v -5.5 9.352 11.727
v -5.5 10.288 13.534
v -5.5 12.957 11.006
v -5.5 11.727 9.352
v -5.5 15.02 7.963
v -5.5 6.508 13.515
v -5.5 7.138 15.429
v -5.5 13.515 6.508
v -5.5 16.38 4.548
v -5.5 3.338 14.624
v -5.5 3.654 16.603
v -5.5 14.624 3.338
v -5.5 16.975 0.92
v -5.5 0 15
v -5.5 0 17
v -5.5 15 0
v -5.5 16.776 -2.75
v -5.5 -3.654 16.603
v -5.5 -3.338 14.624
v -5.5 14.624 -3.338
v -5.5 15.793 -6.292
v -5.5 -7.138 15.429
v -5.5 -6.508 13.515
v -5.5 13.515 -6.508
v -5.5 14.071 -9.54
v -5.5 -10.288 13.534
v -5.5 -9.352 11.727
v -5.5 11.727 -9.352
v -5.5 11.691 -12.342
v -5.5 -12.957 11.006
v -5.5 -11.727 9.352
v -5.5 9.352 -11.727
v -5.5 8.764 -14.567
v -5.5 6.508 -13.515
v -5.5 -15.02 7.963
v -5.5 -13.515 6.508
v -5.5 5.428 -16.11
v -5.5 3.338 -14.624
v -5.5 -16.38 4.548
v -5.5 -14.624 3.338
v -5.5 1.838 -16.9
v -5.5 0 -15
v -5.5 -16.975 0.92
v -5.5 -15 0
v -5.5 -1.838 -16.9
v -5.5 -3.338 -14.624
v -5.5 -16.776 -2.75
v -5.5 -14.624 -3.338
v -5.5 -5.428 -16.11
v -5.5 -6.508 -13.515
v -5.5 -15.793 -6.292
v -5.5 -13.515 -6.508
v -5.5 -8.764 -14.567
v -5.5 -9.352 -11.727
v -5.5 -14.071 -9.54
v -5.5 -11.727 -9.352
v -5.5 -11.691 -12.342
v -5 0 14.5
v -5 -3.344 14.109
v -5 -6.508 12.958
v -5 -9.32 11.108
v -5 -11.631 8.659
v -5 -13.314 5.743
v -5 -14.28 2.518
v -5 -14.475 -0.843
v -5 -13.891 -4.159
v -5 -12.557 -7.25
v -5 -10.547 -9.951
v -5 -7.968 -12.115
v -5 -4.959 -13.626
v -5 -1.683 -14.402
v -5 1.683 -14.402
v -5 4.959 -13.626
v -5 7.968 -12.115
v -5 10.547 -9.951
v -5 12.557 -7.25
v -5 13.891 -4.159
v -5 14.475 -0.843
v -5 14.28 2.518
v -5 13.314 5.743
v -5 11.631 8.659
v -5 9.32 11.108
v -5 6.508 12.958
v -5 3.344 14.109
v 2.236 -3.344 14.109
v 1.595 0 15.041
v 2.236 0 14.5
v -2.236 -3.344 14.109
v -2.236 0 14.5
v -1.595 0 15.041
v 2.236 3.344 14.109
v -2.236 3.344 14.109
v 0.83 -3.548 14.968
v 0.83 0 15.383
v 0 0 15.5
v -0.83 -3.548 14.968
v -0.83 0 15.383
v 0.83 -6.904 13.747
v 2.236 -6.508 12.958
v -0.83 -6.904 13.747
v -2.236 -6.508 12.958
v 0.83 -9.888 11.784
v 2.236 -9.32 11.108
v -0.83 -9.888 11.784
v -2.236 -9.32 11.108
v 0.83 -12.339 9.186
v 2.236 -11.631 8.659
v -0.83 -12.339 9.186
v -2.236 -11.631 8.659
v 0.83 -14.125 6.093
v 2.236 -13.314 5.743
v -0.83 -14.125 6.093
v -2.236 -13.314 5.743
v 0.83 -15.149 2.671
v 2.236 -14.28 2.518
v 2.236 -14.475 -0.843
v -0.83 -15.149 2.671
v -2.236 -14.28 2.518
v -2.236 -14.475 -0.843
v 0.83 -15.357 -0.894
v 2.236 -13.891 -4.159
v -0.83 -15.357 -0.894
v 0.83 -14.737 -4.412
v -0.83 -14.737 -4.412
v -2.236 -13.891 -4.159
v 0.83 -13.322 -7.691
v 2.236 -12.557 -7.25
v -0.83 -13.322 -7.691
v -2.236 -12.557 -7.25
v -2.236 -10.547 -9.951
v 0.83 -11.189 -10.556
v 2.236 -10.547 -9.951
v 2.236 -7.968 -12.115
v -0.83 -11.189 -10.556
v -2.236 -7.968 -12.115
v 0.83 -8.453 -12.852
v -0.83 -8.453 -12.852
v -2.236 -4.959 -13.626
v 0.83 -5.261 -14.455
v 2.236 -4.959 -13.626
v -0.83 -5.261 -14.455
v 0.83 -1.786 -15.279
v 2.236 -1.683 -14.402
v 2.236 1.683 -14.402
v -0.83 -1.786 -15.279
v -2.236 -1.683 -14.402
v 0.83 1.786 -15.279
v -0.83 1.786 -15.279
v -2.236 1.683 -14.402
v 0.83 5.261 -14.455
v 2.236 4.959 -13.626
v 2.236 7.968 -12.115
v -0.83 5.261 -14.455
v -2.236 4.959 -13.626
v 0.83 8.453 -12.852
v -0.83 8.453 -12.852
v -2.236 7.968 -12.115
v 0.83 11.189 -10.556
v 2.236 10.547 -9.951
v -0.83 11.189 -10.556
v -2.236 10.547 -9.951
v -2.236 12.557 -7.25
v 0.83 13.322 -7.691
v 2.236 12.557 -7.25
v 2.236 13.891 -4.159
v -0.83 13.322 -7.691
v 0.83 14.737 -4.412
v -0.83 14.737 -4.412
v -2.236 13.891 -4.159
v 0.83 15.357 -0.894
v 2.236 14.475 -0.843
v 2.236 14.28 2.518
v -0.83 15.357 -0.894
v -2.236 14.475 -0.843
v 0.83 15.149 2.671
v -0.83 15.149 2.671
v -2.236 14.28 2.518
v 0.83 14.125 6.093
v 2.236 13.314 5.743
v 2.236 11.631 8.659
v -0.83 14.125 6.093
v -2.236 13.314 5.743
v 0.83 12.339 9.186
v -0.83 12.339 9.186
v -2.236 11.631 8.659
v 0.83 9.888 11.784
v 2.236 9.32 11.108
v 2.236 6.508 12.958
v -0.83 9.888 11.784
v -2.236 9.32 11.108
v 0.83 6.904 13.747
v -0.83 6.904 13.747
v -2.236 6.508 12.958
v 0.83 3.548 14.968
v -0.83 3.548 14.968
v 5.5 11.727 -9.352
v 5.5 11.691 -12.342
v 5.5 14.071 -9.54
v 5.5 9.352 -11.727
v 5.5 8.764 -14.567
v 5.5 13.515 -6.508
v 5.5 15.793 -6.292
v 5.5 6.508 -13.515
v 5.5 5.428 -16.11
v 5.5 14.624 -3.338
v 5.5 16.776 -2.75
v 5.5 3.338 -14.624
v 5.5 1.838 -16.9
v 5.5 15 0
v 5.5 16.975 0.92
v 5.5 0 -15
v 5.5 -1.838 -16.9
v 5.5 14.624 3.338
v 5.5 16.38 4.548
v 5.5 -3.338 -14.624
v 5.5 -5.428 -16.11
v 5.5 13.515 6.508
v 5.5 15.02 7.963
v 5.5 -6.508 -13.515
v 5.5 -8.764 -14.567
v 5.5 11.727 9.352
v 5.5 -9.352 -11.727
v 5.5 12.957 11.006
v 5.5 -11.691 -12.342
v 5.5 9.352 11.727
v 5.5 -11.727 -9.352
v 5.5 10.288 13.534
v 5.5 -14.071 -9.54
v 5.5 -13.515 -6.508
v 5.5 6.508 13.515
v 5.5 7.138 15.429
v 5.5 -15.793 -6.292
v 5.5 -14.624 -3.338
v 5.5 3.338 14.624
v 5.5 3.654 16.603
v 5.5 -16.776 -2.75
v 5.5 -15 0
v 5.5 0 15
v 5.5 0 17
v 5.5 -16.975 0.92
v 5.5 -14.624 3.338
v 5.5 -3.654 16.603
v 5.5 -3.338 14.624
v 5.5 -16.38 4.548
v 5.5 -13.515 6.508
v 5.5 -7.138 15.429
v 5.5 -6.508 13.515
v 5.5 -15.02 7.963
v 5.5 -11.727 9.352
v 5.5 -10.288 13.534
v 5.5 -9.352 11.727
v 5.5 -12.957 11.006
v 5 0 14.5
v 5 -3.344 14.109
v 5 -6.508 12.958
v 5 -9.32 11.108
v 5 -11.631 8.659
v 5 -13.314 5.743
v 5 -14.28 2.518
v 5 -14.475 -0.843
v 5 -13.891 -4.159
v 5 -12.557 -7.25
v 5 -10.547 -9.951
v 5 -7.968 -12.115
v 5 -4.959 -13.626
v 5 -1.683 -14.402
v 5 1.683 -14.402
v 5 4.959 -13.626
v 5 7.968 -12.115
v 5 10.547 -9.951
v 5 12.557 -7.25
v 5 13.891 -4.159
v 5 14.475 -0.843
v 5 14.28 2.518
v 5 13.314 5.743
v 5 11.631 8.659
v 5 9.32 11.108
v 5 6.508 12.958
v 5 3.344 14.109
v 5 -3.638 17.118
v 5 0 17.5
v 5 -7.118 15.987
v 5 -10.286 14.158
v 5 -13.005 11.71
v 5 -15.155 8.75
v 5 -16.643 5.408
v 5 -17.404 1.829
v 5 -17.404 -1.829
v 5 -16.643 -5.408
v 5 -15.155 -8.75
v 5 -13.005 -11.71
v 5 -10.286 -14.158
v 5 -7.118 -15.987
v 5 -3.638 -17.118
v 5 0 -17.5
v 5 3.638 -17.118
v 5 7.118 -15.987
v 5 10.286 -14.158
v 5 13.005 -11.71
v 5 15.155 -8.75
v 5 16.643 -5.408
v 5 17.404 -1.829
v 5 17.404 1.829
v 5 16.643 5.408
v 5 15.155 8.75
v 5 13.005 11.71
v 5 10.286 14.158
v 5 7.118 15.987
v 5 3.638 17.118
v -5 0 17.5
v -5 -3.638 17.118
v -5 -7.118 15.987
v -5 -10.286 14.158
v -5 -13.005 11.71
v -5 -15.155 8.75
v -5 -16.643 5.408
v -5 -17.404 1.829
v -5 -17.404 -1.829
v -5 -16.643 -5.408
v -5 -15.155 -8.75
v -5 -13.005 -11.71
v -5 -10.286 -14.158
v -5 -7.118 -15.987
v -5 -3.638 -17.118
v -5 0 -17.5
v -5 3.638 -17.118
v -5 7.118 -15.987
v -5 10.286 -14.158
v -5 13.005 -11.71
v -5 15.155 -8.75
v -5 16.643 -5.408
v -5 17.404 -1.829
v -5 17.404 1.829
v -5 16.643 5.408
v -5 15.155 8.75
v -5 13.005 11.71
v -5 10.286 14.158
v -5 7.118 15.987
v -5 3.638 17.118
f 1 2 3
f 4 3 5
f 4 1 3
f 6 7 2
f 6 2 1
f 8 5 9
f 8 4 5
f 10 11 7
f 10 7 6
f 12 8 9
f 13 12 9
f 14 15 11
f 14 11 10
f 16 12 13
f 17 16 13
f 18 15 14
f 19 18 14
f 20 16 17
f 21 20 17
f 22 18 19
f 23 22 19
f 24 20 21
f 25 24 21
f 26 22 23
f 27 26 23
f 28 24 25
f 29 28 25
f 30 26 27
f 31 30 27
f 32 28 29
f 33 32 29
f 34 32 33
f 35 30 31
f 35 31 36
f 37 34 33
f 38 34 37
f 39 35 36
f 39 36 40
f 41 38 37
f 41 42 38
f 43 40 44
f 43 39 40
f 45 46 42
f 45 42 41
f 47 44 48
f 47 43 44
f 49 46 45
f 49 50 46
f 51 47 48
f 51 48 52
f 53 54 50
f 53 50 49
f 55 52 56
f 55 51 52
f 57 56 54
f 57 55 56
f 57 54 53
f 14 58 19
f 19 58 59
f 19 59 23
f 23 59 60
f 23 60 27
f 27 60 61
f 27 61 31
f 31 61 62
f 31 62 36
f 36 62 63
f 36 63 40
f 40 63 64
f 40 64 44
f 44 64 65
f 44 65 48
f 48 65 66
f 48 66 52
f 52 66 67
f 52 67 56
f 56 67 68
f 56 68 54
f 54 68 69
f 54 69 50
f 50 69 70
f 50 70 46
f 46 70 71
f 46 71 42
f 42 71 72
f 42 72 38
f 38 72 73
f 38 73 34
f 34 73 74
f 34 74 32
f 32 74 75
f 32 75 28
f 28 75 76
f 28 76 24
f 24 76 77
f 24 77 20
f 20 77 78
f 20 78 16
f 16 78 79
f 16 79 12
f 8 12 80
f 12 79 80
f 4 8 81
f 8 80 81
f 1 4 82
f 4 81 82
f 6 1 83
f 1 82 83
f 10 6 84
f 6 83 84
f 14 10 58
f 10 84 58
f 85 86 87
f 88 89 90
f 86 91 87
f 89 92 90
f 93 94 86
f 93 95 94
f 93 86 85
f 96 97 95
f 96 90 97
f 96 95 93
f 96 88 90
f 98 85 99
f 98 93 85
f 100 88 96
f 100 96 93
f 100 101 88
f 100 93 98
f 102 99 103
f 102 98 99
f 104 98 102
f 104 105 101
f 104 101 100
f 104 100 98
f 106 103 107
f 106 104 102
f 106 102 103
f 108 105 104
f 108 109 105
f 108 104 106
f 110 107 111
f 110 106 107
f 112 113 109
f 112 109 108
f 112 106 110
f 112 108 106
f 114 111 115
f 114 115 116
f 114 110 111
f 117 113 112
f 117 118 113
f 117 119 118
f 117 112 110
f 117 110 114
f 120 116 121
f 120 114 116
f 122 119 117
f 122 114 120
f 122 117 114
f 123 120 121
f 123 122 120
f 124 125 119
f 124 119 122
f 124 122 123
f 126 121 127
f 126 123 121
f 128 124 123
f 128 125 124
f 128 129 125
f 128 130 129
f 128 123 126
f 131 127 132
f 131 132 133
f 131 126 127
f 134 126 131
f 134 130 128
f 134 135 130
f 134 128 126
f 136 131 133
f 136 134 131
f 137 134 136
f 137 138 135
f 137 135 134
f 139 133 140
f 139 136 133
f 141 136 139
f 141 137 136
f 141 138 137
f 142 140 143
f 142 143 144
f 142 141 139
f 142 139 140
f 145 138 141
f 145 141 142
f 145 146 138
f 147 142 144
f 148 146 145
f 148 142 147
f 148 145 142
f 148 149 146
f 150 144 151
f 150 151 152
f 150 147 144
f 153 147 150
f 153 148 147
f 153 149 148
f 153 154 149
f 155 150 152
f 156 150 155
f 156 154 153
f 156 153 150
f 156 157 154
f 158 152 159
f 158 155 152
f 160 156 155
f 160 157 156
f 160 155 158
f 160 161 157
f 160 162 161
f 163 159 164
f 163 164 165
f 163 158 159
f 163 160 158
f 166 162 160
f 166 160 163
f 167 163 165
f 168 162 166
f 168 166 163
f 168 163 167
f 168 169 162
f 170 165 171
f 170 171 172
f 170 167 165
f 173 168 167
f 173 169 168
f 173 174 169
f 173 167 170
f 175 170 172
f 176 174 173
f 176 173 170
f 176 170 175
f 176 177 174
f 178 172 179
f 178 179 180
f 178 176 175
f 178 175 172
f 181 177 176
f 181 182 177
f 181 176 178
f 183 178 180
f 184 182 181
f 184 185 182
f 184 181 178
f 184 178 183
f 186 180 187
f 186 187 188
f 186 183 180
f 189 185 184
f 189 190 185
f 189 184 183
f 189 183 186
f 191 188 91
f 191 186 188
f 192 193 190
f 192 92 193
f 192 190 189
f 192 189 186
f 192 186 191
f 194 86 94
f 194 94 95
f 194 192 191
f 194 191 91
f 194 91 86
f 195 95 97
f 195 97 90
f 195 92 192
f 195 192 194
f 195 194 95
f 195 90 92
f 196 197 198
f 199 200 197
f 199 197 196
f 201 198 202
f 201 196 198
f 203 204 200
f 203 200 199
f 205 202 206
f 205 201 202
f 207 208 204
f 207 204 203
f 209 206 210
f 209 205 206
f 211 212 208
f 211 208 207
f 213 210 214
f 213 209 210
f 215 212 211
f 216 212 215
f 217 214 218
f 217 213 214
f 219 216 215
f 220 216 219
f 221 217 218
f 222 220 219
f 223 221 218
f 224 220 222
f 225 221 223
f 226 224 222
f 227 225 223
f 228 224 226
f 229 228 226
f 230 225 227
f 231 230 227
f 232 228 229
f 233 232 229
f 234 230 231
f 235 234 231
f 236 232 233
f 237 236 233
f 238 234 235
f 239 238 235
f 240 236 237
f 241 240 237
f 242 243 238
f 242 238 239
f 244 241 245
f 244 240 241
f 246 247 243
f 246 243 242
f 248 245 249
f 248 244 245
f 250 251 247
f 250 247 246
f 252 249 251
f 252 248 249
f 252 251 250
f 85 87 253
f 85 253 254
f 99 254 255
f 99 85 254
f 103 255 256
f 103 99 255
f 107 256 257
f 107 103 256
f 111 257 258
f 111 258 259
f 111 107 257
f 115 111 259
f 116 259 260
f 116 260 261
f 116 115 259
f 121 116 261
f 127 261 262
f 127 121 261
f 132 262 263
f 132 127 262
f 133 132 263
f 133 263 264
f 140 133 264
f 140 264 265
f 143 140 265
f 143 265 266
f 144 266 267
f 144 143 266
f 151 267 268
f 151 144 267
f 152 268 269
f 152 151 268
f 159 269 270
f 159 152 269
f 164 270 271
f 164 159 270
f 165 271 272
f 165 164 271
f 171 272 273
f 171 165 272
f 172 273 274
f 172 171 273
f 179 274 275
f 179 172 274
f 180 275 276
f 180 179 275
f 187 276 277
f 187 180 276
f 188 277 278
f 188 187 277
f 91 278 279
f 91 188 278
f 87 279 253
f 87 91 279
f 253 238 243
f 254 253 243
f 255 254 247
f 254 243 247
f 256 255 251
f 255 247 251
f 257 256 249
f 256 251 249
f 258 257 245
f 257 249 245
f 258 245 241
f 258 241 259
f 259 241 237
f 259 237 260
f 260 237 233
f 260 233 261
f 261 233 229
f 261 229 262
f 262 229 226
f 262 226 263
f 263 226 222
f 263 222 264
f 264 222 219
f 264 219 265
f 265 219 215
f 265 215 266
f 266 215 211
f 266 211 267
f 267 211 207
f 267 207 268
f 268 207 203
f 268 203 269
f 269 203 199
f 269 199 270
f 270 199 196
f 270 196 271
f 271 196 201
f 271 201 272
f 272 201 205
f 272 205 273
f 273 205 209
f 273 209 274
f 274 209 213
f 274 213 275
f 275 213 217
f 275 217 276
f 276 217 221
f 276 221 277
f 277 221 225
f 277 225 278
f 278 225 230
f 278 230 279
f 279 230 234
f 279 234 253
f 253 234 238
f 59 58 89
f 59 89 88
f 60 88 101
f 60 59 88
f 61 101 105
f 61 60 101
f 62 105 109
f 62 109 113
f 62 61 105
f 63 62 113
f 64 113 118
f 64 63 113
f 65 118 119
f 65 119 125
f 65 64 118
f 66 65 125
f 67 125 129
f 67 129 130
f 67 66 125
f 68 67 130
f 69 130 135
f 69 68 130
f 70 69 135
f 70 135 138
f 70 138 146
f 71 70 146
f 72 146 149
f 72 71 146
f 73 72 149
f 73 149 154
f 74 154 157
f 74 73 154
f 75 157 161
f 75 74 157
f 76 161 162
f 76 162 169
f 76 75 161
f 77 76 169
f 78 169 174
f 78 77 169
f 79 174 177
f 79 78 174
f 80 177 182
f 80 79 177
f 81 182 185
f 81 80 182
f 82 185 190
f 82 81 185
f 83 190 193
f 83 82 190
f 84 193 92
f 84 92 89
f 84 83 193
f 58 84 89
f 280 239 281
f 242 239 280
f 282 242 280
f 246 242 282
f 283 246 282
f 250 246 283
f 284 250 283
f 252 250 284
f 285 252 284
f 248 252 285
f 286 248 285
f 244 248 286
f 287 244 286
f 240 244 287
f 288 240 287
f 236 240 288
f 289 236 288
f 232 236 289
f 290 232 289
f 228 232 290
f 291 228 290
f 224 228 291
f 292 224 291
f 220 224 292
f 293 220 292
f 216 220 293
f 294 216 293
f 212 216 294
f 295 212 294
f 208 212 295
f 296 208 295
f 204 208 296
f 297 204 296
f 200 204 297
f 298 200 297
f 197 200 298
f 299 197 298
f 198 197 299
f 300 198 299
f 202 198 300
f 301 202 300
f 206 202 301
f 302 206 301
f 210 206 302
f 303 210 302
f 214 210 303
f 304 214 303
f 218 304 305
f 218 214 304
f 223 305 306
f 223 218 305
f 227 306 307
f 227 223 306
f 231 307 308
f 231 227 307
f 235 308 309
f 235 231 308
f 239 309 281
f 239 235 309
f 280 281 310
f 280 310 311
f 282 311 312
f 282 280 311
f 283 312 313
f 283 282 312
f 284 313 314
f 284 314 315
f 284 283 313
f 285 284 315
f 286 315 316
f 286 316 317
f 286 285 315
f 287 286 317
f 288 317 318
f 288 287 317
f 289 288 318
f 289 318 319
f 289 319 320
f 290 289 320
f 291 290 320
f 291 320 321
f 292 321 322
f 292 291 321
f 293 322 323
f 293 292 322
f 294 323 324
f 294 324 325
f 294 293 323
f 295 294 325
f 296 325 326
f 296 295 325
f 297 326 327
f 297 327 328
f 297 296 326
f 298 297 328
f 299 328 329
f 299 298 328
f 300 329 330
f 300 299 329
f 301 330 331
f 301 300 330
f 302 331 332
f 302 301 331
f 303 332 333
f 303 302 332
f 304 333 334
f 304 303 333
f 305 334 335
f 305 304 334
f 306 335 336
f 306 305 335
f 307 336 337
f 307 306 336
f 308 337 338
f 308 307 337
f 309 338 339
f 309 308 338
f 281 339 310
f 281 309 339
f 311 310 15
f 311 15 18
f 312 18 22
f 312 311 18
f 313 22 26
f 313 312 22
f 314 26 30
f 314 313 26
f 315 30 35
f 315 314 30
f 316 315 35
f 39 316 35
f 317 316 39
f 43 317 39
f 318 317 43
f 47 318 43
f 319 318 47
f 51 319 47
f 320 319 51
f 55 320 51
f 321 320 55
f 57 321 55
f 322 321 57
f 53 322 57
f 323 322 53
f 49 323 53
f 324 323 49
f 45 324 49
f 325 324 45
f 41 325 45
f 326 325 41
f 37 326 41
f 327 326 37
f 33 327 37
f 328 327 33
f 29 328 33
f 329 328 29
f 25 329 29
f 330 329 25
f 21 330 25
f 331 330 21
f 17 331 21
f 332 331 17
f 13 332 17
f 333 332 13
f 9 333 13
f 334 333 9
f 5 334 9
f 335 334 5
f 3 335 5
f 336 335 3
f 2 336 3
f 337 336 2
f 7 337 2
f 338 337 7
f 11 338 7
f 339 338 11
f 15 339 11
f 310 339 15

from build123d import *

# Parameters (mm, degrees)
CHAMFER1_SIZE = 0.5
CHAMFER2_SIZE = 0.5


with BuildPart() as part:
    # Sketch1 → Revolve1 (revolve)
    with BuildSketch(Plane.XY, mode=Mode.PRIVATE) as revolve1_sk:
        with BuildLine():
            Line((5.5, 14.5), (2.236067977, 14.5))
            ThreePointArc((2.236067977, 14.5), (0, 15.5), (-2.236067977, 14.5))
            Line((-2.236067977, 14.5), (-5.5, 14.5))
            Line((-5.5, 14.5), (-5.5, 17.5))
            Line((-5.5, 17.5), (5.5, 17.5))
            Line((5.5, 17.5), (5.5, 14.5))
        make_face()
    revolve(revolve1_sk.sketch.rotate(Axis((-7.5, 0, 0), (1, 0, 0)), 90), axis=Axis((-7.5, 0, 0), (1, 0, 0)))

    # Chamfer1
    chamfer1_edges = [part.edges().sort_by_distance(p)[0] for p in [
        (5.5, 0, -17.5),
        (-5.5, 0, -17.5),
    ]]
    chamfer(chamfer1_edges, length=CHAMFER1_SIZE)

    # Chamfer2
    chamfer2_edges = [part.edges().sort_by_distance(p)[0] for p in [
        (-5.5, 0, -14.5),
        (5.5, 0, -14.5),
    ]]
    chamfer(chamfer2_edges, length=CHAMFER2_SIZE)


solid = part.part
